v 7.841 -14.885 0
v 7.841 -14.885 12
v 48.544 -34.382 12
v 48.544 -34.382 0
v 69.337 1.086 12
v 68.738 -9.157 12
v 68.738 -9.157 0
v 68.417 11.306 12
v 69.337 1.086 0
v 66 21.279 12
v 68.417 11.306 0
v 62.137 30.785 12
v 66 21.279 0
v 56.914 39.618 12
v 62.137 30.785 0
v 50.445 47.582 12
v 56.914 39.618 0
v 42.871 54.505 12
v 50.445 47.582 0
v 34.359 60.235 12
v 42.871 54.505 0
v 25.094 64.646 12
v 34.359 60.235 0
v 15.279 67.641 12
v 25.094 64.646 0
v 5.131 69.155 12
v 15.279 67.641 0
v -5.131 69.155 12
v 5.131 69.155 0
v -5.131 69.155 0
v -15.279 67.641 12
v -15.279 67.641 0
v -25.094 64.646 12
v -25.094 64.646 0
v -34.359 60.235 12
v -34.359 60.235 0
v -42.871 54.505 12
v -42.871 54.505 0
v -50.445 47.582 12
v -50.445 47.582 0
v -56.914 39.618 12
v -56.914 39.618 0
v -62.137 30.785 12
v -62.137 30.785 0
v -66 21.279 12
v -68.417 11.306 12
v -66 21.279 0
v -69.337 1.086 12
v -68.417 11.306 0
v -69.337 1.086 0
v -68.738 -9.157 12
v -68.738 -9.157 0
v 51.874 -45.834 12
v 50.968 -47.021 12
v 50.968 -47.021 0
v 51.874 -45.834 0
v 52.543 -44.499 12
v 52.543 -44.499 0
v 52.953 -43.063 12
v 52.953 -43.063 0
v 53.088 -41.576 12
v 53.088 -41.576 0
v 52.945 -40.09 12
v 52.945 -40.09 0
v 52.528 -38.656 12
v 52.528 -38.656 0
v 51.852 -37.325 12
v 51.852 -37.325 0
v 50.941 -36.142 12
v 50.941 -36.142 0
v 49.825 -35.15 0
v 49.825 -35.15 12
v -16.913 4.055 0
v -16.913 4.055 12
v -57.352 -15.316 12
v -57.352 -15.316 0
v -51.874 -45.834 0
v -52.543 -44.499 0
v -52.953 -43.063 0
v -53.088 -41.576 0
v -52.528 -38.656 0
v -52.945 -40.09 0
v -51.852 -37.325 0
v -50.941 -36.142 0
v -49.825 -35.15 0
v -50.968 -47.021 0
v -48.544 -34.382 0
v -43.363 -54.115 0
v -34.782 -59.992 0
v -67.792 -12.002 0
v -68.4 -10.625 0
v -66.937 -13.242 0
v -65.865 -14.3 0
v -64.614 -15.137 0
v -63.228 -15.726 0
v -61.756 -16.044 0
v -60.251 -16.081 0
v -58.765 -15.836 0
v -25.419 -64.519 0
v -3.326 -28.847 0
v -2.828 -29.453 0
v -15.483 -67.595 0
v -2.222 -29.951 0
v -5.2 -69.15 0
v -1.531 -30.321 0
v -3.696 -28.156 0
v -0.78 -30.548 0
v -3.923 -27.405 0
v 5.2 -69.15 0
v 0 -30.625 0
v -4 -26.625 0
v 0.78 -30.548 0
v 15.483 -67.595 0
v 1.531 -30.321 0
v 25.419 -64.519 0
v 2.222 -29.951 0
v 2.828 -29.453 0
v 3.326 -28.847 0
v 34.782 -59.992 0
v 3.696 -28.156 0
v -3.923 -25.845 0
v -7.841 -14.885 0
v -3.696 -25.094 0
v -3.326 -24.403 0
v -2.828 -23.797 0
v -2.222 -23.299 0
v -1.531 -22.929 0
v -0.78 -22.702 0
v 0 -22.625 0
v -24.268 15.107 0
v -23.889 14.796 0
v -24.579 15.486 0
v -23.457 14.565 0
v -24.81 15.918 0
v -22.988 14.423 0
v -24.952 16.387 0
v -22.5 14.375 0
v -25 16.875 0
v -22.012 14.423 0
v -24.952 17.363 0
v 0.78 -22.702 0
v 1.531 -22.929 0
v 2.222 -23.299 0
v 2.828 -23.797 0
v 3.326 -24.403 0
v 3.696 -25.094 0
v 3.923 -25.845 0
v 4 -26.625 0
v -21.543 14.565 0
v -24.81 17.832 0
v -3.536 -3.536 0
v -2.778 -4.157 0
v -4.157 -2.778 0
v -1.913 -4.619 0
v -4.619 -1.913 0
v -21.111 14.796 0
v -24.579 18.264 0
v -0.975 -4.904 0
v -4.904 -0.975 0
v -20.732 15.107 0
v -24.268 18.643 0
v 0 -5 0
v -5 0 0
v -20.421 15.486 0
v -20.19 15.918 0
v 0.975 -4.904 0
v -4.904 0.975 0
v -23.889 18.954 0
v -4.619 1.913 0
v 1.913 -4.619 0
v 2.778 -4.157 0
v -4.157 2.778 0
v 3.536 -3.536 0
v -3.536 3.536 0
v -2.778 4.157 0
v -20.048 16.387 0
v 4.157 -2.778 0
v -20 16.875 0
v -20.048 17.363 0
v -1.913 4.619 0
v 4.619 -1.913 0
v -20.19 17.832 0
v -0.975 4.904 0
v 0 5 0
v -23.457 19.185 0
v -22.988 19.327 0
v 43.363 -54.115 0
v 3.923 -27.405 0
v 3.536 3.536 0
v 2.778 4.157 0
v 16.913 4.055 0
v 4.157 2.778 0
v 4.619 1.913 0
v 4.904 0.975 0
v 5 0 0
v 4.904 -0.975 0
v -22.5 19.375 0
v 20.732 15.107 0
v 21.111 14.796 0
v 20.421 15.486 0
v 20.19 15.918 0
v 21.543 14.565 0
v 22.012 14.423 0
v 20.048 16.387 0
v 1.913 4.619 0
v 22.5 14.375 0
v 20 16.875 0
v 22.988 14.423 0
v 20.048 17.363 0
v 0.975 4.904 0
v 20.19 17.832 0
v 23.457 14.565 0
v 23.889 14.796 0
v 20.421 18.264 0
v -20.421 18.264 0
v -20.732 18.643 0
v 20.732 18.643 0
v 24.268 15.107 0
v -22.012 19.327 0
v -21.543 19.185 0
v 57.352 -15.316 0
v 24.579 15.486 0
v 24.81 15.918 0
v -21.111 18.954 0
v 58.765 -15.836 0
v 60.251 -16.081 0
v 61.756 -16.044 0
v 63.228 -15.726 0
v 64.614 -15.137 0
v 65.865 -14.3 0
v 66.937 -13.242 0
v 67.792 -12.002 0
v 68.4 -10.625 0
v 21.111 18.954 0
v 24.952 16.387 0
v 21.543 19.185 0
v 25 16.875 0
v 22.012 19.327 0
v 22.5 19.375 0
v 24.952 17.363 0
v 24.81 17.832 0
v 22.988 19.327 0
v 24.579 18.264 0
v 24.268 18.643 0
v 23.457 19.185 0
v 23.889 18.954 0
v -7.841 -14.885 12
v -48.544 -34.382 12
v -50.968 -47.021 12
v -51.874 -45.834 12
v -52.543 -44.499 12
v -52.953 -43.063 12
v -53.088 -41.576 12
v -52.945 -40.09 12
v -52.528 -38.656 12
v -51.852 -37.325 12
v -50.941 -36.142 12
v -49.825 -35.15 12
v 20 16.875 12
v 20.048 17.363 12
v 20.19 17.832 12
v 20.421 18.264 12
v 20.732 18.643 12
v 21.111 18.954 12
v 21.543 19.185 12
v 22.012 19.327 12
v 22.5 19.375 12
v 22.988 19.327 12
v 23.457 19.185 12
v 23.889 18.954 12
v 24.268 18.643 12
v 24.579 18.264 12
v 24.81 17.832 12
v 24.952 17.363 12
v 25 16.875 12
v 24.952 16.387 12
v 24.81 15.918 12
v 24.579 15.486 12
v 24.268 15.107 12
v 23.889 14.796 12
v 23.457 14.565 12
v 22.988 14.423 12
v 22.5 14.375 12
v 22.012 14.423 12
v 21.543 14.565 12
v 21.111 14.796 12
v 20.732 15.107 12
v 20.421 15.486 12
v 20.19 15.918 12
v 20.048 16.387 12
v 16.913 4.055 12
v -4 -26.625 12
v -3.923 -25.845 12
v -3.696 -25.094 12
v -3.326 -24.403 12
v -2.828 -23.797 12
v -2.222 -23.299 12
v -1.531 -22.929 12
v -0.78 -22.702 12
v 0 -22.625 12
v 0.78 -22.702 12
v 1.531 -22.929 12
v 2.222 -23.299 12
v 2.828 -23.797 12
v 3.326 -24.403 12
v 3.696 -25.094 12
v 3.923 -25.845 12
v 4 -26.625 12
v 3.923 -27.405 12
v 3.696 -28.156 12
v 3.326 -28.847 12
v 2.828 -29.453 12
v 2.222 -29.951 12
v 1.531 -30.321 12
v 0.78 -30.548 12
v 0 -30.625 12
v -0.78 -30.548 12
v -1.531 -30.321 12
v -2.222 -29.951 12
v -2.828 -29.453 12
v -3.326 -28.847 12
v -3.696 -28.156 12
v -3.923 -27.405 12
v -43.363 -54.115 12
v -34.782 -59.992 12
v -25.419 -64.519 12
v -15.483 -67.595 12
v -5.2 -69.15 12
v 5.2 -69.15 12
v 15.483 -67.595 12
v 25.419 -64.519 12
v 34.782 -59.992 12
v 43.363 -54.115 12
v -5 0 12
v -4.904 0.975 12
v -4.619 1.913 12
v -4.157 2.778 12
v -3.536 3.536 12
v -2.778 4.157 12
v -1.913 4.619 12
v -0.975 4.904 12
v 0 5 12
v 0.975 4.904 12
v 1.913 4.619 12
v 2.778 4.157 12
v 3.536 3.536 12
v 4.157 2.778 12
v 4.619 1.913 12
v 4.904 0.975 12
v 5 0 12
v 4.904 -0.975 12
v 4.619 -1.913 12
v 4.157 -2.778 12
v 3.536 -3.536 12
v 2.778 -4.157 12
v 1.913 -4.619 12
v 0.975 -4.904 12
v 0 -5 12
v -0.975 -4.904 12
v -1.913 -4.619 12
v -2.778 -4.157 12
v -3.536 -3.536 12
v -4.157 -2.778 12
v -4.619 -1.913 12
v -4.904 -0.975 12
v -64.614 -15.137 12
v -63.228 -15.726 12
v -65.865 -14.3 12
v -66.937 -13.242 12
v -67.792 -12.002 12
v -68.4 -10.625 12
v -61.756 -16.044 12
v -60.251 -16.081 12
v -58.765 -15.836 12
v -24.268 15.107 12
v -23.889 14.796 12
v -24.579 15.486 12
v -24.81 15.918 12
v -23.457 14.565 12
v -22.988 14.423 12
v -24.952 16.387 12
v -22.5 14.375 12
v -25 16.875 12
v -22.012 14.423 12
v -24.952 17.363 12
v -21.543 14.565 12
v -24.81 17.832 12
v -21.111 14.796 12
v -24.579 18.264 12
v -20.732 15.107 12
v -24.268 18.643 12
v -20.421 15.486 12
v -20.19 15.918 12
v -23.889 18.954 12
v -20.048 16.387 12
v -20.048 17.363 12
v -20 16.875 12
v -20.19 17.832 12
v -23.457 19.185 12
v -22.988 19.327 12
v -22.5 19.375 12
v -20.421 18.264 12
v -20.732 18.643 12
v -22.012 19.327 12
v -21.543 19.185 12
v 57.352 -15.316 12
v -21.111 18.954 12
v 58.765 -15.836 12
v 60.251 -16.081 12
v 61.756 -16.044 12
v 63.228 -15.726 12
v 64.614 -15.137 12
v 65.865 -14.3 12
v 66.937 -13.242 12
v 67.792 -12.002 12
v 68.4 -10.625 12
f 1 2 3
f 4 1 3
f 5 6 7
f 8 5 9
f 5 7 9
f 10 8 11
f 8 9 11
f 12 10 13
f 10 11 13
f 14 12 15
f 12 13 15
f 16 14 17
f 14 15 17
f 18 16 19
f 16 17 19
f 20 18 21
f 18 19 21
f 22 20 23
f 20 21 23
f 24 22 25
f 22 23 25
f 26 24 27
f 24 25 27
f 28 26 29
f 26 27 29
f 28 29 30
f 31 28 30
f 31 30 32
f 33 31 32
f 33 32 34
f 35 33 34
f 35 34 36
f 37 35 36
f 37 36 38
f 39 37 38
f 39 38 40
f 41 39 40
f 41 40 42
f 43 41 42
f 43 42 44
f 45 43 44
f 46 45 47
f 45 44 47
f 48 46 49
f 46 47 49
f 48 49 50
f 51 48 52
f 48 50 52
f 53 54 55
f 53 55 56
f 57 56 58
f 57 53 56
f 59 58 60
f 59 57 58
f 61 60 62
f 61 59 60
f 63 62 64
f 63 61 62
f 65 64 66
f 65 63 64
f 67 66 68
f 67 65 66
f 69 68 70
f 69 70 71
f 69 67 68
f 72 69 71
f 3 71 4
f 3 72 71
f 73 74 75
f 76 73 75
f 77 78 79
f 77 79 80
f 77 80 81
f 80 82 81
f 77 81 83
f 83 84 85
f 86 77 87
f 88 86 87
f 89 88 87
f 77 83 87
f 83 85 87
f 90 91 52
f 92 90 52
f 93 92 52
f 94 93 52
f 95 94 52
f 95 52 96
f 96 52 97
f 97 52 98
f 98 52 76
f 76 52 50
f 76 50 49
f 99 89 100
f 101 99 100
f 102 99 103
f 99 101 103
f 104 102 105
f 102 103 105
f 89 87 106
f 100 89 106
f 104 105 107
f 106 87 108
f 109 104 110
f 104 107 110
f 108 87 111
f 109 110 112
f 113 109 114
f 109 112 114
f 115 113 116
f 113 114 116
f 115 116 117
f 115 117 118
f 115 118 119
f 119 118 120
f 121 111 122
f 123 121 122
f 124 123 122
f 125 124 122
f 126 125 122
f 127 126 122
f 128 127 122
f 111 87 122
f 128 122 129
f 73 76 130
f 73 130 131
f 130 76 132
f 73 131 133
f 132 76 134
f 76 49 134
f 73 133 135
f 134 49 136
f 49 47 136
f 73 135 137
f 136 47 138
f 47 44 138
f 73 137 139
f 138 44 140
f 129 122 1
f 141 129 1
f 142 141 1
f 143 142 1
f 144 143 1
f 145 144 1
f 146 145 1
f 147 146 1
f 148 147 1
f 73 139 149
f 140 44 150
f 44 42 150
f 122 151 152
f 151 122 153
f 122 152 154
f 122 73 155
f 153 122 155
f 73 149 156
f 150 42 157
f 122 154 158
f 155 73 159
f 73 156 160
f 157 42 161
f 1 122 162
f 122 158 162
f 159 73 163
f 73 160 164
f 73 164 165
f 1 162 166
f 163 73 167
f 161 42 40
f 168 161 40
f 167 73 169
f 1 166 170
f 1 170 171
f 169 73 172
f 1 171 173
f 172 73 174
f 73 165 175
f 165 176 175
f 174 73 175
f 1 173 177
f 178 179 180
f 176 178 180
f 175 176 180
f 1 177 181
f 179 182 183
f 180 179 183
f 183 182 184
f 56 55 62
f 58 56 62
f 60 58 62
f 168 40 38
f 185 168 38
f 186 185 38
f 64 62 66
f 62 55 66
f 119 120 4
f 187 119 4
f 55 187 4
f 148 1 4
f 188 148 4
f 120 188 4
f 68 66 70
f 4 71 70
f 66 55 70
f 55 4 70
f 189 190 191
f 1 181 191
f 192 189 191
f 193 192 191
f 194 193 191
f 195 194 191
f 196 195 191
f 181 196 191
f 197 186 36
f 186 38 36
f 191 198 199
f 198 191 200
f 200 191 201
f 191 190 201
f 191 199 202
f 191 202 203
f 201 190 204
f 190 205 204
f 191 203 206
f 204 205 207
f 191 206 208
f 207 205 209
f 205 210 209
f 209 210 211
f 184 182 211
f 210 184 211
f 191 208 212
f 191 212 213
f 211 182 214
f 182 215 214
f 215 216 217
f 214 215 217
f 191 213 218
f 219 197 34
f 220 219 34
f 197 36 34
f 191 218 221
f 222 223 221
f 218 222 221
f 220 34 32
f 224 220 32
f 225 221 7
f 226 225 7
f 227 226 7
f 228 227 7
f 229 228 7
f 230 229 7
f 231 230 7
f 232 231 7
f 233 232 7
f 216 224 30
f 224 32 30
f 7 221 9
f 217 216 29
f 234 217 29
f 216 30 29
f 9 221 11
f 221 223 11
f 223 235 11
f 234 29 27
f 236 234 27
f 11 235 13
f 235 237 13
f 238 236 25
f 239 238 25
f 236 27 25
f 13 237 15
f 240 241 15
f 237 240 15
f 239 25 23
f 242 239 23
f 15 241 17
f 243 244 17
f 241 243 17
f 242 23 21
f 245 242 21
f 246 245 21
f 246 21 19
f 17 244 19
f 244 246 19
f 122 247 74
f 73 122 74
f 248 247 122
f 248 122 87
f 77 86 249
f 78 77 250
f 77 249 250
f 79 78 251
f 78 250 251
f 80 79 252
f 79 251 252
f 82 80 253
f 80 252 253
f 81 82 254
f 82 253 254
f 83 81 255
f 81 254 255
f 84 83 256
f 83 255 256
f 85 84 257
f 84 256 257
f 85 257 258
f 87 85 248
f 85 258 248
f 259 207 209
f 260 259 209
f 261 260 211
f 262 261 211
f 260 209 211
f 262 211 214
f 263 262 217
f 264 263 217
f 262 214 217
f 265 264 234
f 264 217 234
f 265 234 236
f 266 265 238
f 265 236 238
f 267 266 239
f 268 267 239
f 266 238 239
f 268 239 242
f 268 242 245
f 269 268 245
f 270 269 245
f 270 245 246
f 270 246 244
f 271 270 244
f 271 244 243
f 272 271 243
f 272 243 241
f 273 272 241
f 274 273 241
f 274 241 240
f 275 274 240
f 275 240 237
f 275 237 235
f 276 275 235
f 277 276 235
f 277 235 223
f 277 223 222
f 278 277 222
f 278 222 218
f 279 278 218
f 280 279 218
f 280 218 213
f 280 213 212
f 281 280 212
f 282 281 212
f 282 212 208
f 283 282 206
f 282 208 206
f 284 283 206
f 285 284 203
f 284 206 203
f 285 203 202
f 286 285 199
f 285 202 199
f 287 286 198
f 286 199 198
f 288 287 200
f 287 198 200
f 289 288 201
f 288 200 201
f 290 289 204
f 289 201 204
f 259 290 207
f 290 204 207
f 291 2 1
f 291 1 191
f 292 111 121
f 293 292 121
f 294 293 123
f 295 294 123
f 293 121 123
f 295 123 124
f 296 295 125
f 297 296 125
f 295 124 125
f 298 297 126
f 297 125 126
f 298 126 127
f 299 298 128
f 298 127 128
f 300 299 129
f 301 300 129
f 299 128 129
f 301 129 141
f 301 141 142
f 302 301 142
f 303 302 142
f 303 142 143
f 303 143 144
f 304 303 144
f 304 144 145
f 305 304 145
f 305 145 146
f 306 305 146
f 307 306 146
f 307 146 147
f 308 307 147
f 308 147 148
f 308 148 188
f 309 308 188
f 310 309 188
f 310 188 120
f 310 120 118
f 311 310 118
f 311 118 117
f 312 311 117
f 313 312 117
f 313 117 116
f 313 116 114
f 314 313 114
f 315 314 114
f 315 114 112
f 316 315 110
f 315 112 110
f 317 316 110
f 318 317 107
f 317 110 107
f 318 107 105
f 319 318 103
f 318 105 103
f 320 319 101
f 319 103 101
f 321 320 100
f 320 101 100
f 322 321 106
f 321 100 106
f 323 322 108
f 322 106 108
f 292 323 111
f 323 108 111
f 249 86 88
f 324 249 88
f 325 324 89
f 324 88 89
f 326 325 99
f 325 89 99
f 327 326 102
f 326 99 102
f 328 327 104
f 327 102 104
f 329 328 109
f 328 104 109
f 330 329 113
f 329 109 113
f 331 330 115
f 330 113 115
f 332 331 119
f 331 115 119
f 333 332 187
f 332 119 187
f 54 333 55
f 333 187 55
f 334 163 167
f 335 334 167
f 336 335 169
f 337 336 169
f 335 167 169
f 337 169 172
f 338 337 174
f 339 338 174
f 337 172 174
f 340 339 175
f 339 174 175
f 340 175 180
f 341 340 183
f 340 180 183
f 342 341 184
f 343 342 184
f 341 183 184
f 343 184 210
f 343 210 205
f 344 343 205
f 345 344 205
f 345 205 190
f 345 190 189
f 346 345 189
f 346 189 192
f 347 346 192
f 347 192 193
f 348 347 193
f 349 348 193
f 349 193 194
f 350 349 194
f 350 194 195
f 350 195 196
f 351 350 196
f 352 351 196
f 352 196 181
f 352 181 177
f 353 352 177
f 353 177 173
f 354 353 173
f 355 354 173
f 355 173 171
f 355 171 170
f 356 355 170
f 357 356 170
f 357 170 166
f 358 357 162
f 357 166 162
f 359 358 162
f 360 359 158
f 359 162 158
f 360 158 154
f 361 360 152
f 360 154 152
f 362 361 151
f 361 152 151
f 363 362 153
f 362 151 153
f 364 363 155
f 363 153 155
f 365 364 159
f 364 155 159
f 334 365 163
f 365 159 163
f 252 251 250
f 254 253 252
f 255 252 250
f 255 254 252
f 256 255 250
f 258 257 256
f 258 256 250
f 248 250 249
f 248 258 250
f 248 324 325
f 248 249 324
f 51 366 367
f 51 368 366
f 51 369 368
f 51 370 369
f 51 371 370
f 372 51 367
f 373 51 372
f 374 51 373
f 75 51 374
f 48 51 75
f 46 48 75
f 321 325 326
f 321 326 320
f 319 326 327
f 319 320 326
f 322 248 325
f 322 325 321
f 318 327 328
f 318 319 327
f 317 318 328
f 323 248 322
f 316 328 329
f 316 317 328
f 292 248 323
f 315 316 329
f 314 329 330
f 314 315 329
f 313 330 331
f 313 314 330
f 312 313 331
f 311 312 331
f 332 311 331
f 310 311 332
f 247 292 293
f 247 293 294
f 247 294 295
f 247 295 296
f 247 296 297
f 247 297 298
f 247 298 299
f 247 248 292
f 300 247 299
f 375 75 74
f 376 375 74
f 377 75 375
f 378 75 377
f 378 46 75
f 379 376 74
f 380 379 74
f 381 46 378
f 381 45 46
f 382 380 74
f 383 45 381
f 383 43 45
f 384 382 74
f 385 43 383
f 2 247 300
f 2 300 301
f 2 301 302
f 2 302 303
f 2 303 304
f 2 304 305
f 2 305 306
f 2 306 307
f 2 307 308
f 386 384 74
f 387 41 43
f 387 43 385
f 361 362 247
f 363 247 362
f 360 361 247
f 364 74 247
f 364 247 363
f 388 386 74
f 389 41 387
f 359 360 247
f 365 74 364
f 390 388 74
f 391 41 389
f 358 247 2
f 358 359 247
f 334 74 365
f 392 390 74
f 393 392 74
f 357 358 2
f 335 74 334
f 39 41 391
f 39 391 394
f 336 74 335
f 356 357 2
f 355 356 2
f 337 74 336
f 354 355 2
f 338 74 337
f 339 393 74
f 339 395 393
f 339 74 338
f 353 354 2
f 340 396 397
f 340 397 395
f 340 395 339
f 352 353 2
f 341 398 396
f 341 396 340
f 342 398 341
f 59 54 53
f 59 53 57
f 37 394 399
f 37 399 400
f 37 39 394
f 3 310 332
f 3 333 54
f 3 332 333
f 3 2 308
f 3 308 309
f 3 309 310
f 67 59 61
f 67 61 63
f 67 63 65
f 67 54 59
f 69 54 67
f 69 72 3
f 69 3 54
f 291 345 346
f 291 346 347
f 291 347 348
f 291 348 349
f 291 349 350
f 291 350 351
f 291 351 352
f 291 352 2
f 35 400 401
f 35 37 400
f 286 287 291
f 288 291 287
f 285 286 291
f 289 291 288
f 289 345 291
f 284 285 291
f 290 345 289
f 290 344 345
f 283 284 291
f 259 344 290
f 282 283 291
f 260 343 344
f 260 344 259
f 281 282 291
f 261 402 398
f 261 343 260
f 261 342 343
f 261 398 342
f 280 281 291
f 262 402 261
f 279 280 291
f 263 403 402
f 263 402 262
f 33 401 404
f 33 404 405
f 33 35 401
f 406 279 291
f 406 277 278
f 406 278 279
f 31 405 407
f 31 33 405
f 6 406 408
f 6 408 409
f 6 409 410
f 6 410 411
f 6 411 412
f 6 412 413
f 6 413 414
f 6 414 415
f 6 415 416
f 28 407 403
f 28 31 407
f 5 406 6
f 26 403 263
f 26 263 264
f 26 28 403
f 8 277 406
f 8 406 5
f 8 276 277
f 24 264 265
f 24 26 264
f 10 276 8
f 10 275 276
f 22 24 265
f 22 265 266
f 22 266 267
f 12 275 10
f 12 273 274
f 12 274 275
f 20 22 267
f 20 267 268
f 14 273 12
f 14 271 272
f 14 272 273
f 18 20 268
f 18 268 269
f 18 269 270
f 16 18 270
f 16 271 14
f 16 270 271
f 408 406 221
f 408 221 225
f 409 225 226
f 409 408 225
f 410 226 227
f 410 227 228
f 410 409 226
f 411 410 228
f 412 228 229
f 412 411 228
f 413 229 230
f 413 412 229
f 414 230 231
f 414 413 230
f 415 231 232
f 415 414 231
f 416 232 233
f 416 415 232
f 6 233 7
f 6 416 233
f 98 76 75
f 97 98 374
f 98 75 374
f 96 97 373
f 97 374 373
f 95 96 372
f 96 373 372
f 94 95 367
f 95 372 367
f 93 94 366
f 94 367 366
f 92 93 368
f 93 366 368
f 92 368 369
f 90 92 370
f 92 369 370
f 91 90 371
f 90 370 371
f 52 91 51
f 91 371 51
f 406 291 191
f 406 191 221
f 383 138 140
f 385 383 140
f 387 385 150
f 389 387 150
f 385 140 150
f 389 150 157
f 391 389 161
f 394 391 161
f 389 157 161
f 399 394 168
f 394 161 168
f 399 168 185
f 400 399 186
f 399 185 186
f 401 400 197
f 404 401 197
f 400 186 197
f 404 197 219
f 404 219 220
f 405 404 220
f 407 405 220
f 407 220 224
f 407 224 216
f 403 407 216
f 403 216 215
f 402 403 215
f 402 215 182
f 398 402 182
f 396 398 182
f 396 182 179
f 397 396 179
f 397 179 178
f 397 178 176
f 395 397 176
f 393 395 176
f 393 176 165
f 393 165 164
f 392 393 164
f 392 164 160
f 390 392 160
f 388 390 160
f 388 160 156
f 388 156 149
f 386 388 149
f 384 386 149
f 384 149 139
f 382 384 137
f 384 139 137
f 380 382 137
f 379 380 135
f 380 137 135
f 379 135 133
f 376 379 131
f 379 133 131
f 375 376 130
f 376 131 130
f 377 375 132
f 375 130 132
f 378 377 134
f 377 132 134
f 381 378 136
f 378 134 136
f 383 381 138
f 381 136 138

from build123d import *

# Parameters (mm, degrees)
SKETCH_R        = 69.345339
PAD_DEPTH       = 12
SKETCH001_R     = 5
POCKET_DEPTH    = 12.001
SKETCH006_R     = 4
SKETCH006_R_2   = 2.5
POCKET001_DEPTH = 12.001
POCKET002_DEPTH = 405.010966


with BuildPart() as part:
    # Sketch → Pad (new body)
    with BuildSketch(Plane.XY):
        Circle(SKETCH_R)
    extrude(amount=PAD_DEPTH)

    # Sketch001 → Pocket (cut, through all)
    with BuildSketch(Plane(origin=(0, 0, 0), x_dir=(-1, 0, 0), z_dir=(0, 0, -1))):
        Circle(SKETCH001_R)
    extrude(amount=-POCKET_DEPTH, mode=Mode.SUBTRACT)

    # Sketch006 → Pocket001 (cut, through all)
    with BuildSketch(Plane(origin=(0, 0, 0), x_dir=(-1, 0, 0), z_dir=(0, 0, -1))):
        with Locations((0, -26.625)):
            Circle(SKETCH006_R)
        with Locations((-22.5, 16.875)):
            Circle(SKETCH006_R_2)
        with Locations((22.5, 16.875)):
            Circle(SKETCH006_R_2)
    extrude(amount=-POCKET001_DEPTH, mode=Mode.SUBTRACT)

    # Sketch007 → Pocket002 (cut, through all)
    with BuildSketch(Plane.XY.offset(12)):
        with BuildLine():
            Line((7.84131, -14.884662), (16.91337, 4.054655))
            Line((16.91337, 4.054655), (57.3521, -15.315769))
            ThreePointArc((57.3521, -15.315769), (64.614164, -15.137413), (68.738065, -9.157209))
            ThreePointArc((50.968353, -47.021304), (62.776023, -29.460941), (68.738065, -9.157209))
            ThreePointArc((50.968353, -47.021304), (52.945237, -40.089985), (48.54443, -34.381731))
            Line((7.84131, -14.884662), (48.54443, -34.381731))
        make_face()
    pocket002 = extrude(amount=-POCKET002_DEPTH, mode=Mode.SUBTRACT)

    # Mirrored: Pocket002 across Sketch007 V_Axis
    add(pocket002.mirror(Plane(origin=(0, 0, 12), x_dir=(0, 0, 1), z_dir=(1, 0, 0))), mode=Mode.SUBTRACT)


solid = part.part
